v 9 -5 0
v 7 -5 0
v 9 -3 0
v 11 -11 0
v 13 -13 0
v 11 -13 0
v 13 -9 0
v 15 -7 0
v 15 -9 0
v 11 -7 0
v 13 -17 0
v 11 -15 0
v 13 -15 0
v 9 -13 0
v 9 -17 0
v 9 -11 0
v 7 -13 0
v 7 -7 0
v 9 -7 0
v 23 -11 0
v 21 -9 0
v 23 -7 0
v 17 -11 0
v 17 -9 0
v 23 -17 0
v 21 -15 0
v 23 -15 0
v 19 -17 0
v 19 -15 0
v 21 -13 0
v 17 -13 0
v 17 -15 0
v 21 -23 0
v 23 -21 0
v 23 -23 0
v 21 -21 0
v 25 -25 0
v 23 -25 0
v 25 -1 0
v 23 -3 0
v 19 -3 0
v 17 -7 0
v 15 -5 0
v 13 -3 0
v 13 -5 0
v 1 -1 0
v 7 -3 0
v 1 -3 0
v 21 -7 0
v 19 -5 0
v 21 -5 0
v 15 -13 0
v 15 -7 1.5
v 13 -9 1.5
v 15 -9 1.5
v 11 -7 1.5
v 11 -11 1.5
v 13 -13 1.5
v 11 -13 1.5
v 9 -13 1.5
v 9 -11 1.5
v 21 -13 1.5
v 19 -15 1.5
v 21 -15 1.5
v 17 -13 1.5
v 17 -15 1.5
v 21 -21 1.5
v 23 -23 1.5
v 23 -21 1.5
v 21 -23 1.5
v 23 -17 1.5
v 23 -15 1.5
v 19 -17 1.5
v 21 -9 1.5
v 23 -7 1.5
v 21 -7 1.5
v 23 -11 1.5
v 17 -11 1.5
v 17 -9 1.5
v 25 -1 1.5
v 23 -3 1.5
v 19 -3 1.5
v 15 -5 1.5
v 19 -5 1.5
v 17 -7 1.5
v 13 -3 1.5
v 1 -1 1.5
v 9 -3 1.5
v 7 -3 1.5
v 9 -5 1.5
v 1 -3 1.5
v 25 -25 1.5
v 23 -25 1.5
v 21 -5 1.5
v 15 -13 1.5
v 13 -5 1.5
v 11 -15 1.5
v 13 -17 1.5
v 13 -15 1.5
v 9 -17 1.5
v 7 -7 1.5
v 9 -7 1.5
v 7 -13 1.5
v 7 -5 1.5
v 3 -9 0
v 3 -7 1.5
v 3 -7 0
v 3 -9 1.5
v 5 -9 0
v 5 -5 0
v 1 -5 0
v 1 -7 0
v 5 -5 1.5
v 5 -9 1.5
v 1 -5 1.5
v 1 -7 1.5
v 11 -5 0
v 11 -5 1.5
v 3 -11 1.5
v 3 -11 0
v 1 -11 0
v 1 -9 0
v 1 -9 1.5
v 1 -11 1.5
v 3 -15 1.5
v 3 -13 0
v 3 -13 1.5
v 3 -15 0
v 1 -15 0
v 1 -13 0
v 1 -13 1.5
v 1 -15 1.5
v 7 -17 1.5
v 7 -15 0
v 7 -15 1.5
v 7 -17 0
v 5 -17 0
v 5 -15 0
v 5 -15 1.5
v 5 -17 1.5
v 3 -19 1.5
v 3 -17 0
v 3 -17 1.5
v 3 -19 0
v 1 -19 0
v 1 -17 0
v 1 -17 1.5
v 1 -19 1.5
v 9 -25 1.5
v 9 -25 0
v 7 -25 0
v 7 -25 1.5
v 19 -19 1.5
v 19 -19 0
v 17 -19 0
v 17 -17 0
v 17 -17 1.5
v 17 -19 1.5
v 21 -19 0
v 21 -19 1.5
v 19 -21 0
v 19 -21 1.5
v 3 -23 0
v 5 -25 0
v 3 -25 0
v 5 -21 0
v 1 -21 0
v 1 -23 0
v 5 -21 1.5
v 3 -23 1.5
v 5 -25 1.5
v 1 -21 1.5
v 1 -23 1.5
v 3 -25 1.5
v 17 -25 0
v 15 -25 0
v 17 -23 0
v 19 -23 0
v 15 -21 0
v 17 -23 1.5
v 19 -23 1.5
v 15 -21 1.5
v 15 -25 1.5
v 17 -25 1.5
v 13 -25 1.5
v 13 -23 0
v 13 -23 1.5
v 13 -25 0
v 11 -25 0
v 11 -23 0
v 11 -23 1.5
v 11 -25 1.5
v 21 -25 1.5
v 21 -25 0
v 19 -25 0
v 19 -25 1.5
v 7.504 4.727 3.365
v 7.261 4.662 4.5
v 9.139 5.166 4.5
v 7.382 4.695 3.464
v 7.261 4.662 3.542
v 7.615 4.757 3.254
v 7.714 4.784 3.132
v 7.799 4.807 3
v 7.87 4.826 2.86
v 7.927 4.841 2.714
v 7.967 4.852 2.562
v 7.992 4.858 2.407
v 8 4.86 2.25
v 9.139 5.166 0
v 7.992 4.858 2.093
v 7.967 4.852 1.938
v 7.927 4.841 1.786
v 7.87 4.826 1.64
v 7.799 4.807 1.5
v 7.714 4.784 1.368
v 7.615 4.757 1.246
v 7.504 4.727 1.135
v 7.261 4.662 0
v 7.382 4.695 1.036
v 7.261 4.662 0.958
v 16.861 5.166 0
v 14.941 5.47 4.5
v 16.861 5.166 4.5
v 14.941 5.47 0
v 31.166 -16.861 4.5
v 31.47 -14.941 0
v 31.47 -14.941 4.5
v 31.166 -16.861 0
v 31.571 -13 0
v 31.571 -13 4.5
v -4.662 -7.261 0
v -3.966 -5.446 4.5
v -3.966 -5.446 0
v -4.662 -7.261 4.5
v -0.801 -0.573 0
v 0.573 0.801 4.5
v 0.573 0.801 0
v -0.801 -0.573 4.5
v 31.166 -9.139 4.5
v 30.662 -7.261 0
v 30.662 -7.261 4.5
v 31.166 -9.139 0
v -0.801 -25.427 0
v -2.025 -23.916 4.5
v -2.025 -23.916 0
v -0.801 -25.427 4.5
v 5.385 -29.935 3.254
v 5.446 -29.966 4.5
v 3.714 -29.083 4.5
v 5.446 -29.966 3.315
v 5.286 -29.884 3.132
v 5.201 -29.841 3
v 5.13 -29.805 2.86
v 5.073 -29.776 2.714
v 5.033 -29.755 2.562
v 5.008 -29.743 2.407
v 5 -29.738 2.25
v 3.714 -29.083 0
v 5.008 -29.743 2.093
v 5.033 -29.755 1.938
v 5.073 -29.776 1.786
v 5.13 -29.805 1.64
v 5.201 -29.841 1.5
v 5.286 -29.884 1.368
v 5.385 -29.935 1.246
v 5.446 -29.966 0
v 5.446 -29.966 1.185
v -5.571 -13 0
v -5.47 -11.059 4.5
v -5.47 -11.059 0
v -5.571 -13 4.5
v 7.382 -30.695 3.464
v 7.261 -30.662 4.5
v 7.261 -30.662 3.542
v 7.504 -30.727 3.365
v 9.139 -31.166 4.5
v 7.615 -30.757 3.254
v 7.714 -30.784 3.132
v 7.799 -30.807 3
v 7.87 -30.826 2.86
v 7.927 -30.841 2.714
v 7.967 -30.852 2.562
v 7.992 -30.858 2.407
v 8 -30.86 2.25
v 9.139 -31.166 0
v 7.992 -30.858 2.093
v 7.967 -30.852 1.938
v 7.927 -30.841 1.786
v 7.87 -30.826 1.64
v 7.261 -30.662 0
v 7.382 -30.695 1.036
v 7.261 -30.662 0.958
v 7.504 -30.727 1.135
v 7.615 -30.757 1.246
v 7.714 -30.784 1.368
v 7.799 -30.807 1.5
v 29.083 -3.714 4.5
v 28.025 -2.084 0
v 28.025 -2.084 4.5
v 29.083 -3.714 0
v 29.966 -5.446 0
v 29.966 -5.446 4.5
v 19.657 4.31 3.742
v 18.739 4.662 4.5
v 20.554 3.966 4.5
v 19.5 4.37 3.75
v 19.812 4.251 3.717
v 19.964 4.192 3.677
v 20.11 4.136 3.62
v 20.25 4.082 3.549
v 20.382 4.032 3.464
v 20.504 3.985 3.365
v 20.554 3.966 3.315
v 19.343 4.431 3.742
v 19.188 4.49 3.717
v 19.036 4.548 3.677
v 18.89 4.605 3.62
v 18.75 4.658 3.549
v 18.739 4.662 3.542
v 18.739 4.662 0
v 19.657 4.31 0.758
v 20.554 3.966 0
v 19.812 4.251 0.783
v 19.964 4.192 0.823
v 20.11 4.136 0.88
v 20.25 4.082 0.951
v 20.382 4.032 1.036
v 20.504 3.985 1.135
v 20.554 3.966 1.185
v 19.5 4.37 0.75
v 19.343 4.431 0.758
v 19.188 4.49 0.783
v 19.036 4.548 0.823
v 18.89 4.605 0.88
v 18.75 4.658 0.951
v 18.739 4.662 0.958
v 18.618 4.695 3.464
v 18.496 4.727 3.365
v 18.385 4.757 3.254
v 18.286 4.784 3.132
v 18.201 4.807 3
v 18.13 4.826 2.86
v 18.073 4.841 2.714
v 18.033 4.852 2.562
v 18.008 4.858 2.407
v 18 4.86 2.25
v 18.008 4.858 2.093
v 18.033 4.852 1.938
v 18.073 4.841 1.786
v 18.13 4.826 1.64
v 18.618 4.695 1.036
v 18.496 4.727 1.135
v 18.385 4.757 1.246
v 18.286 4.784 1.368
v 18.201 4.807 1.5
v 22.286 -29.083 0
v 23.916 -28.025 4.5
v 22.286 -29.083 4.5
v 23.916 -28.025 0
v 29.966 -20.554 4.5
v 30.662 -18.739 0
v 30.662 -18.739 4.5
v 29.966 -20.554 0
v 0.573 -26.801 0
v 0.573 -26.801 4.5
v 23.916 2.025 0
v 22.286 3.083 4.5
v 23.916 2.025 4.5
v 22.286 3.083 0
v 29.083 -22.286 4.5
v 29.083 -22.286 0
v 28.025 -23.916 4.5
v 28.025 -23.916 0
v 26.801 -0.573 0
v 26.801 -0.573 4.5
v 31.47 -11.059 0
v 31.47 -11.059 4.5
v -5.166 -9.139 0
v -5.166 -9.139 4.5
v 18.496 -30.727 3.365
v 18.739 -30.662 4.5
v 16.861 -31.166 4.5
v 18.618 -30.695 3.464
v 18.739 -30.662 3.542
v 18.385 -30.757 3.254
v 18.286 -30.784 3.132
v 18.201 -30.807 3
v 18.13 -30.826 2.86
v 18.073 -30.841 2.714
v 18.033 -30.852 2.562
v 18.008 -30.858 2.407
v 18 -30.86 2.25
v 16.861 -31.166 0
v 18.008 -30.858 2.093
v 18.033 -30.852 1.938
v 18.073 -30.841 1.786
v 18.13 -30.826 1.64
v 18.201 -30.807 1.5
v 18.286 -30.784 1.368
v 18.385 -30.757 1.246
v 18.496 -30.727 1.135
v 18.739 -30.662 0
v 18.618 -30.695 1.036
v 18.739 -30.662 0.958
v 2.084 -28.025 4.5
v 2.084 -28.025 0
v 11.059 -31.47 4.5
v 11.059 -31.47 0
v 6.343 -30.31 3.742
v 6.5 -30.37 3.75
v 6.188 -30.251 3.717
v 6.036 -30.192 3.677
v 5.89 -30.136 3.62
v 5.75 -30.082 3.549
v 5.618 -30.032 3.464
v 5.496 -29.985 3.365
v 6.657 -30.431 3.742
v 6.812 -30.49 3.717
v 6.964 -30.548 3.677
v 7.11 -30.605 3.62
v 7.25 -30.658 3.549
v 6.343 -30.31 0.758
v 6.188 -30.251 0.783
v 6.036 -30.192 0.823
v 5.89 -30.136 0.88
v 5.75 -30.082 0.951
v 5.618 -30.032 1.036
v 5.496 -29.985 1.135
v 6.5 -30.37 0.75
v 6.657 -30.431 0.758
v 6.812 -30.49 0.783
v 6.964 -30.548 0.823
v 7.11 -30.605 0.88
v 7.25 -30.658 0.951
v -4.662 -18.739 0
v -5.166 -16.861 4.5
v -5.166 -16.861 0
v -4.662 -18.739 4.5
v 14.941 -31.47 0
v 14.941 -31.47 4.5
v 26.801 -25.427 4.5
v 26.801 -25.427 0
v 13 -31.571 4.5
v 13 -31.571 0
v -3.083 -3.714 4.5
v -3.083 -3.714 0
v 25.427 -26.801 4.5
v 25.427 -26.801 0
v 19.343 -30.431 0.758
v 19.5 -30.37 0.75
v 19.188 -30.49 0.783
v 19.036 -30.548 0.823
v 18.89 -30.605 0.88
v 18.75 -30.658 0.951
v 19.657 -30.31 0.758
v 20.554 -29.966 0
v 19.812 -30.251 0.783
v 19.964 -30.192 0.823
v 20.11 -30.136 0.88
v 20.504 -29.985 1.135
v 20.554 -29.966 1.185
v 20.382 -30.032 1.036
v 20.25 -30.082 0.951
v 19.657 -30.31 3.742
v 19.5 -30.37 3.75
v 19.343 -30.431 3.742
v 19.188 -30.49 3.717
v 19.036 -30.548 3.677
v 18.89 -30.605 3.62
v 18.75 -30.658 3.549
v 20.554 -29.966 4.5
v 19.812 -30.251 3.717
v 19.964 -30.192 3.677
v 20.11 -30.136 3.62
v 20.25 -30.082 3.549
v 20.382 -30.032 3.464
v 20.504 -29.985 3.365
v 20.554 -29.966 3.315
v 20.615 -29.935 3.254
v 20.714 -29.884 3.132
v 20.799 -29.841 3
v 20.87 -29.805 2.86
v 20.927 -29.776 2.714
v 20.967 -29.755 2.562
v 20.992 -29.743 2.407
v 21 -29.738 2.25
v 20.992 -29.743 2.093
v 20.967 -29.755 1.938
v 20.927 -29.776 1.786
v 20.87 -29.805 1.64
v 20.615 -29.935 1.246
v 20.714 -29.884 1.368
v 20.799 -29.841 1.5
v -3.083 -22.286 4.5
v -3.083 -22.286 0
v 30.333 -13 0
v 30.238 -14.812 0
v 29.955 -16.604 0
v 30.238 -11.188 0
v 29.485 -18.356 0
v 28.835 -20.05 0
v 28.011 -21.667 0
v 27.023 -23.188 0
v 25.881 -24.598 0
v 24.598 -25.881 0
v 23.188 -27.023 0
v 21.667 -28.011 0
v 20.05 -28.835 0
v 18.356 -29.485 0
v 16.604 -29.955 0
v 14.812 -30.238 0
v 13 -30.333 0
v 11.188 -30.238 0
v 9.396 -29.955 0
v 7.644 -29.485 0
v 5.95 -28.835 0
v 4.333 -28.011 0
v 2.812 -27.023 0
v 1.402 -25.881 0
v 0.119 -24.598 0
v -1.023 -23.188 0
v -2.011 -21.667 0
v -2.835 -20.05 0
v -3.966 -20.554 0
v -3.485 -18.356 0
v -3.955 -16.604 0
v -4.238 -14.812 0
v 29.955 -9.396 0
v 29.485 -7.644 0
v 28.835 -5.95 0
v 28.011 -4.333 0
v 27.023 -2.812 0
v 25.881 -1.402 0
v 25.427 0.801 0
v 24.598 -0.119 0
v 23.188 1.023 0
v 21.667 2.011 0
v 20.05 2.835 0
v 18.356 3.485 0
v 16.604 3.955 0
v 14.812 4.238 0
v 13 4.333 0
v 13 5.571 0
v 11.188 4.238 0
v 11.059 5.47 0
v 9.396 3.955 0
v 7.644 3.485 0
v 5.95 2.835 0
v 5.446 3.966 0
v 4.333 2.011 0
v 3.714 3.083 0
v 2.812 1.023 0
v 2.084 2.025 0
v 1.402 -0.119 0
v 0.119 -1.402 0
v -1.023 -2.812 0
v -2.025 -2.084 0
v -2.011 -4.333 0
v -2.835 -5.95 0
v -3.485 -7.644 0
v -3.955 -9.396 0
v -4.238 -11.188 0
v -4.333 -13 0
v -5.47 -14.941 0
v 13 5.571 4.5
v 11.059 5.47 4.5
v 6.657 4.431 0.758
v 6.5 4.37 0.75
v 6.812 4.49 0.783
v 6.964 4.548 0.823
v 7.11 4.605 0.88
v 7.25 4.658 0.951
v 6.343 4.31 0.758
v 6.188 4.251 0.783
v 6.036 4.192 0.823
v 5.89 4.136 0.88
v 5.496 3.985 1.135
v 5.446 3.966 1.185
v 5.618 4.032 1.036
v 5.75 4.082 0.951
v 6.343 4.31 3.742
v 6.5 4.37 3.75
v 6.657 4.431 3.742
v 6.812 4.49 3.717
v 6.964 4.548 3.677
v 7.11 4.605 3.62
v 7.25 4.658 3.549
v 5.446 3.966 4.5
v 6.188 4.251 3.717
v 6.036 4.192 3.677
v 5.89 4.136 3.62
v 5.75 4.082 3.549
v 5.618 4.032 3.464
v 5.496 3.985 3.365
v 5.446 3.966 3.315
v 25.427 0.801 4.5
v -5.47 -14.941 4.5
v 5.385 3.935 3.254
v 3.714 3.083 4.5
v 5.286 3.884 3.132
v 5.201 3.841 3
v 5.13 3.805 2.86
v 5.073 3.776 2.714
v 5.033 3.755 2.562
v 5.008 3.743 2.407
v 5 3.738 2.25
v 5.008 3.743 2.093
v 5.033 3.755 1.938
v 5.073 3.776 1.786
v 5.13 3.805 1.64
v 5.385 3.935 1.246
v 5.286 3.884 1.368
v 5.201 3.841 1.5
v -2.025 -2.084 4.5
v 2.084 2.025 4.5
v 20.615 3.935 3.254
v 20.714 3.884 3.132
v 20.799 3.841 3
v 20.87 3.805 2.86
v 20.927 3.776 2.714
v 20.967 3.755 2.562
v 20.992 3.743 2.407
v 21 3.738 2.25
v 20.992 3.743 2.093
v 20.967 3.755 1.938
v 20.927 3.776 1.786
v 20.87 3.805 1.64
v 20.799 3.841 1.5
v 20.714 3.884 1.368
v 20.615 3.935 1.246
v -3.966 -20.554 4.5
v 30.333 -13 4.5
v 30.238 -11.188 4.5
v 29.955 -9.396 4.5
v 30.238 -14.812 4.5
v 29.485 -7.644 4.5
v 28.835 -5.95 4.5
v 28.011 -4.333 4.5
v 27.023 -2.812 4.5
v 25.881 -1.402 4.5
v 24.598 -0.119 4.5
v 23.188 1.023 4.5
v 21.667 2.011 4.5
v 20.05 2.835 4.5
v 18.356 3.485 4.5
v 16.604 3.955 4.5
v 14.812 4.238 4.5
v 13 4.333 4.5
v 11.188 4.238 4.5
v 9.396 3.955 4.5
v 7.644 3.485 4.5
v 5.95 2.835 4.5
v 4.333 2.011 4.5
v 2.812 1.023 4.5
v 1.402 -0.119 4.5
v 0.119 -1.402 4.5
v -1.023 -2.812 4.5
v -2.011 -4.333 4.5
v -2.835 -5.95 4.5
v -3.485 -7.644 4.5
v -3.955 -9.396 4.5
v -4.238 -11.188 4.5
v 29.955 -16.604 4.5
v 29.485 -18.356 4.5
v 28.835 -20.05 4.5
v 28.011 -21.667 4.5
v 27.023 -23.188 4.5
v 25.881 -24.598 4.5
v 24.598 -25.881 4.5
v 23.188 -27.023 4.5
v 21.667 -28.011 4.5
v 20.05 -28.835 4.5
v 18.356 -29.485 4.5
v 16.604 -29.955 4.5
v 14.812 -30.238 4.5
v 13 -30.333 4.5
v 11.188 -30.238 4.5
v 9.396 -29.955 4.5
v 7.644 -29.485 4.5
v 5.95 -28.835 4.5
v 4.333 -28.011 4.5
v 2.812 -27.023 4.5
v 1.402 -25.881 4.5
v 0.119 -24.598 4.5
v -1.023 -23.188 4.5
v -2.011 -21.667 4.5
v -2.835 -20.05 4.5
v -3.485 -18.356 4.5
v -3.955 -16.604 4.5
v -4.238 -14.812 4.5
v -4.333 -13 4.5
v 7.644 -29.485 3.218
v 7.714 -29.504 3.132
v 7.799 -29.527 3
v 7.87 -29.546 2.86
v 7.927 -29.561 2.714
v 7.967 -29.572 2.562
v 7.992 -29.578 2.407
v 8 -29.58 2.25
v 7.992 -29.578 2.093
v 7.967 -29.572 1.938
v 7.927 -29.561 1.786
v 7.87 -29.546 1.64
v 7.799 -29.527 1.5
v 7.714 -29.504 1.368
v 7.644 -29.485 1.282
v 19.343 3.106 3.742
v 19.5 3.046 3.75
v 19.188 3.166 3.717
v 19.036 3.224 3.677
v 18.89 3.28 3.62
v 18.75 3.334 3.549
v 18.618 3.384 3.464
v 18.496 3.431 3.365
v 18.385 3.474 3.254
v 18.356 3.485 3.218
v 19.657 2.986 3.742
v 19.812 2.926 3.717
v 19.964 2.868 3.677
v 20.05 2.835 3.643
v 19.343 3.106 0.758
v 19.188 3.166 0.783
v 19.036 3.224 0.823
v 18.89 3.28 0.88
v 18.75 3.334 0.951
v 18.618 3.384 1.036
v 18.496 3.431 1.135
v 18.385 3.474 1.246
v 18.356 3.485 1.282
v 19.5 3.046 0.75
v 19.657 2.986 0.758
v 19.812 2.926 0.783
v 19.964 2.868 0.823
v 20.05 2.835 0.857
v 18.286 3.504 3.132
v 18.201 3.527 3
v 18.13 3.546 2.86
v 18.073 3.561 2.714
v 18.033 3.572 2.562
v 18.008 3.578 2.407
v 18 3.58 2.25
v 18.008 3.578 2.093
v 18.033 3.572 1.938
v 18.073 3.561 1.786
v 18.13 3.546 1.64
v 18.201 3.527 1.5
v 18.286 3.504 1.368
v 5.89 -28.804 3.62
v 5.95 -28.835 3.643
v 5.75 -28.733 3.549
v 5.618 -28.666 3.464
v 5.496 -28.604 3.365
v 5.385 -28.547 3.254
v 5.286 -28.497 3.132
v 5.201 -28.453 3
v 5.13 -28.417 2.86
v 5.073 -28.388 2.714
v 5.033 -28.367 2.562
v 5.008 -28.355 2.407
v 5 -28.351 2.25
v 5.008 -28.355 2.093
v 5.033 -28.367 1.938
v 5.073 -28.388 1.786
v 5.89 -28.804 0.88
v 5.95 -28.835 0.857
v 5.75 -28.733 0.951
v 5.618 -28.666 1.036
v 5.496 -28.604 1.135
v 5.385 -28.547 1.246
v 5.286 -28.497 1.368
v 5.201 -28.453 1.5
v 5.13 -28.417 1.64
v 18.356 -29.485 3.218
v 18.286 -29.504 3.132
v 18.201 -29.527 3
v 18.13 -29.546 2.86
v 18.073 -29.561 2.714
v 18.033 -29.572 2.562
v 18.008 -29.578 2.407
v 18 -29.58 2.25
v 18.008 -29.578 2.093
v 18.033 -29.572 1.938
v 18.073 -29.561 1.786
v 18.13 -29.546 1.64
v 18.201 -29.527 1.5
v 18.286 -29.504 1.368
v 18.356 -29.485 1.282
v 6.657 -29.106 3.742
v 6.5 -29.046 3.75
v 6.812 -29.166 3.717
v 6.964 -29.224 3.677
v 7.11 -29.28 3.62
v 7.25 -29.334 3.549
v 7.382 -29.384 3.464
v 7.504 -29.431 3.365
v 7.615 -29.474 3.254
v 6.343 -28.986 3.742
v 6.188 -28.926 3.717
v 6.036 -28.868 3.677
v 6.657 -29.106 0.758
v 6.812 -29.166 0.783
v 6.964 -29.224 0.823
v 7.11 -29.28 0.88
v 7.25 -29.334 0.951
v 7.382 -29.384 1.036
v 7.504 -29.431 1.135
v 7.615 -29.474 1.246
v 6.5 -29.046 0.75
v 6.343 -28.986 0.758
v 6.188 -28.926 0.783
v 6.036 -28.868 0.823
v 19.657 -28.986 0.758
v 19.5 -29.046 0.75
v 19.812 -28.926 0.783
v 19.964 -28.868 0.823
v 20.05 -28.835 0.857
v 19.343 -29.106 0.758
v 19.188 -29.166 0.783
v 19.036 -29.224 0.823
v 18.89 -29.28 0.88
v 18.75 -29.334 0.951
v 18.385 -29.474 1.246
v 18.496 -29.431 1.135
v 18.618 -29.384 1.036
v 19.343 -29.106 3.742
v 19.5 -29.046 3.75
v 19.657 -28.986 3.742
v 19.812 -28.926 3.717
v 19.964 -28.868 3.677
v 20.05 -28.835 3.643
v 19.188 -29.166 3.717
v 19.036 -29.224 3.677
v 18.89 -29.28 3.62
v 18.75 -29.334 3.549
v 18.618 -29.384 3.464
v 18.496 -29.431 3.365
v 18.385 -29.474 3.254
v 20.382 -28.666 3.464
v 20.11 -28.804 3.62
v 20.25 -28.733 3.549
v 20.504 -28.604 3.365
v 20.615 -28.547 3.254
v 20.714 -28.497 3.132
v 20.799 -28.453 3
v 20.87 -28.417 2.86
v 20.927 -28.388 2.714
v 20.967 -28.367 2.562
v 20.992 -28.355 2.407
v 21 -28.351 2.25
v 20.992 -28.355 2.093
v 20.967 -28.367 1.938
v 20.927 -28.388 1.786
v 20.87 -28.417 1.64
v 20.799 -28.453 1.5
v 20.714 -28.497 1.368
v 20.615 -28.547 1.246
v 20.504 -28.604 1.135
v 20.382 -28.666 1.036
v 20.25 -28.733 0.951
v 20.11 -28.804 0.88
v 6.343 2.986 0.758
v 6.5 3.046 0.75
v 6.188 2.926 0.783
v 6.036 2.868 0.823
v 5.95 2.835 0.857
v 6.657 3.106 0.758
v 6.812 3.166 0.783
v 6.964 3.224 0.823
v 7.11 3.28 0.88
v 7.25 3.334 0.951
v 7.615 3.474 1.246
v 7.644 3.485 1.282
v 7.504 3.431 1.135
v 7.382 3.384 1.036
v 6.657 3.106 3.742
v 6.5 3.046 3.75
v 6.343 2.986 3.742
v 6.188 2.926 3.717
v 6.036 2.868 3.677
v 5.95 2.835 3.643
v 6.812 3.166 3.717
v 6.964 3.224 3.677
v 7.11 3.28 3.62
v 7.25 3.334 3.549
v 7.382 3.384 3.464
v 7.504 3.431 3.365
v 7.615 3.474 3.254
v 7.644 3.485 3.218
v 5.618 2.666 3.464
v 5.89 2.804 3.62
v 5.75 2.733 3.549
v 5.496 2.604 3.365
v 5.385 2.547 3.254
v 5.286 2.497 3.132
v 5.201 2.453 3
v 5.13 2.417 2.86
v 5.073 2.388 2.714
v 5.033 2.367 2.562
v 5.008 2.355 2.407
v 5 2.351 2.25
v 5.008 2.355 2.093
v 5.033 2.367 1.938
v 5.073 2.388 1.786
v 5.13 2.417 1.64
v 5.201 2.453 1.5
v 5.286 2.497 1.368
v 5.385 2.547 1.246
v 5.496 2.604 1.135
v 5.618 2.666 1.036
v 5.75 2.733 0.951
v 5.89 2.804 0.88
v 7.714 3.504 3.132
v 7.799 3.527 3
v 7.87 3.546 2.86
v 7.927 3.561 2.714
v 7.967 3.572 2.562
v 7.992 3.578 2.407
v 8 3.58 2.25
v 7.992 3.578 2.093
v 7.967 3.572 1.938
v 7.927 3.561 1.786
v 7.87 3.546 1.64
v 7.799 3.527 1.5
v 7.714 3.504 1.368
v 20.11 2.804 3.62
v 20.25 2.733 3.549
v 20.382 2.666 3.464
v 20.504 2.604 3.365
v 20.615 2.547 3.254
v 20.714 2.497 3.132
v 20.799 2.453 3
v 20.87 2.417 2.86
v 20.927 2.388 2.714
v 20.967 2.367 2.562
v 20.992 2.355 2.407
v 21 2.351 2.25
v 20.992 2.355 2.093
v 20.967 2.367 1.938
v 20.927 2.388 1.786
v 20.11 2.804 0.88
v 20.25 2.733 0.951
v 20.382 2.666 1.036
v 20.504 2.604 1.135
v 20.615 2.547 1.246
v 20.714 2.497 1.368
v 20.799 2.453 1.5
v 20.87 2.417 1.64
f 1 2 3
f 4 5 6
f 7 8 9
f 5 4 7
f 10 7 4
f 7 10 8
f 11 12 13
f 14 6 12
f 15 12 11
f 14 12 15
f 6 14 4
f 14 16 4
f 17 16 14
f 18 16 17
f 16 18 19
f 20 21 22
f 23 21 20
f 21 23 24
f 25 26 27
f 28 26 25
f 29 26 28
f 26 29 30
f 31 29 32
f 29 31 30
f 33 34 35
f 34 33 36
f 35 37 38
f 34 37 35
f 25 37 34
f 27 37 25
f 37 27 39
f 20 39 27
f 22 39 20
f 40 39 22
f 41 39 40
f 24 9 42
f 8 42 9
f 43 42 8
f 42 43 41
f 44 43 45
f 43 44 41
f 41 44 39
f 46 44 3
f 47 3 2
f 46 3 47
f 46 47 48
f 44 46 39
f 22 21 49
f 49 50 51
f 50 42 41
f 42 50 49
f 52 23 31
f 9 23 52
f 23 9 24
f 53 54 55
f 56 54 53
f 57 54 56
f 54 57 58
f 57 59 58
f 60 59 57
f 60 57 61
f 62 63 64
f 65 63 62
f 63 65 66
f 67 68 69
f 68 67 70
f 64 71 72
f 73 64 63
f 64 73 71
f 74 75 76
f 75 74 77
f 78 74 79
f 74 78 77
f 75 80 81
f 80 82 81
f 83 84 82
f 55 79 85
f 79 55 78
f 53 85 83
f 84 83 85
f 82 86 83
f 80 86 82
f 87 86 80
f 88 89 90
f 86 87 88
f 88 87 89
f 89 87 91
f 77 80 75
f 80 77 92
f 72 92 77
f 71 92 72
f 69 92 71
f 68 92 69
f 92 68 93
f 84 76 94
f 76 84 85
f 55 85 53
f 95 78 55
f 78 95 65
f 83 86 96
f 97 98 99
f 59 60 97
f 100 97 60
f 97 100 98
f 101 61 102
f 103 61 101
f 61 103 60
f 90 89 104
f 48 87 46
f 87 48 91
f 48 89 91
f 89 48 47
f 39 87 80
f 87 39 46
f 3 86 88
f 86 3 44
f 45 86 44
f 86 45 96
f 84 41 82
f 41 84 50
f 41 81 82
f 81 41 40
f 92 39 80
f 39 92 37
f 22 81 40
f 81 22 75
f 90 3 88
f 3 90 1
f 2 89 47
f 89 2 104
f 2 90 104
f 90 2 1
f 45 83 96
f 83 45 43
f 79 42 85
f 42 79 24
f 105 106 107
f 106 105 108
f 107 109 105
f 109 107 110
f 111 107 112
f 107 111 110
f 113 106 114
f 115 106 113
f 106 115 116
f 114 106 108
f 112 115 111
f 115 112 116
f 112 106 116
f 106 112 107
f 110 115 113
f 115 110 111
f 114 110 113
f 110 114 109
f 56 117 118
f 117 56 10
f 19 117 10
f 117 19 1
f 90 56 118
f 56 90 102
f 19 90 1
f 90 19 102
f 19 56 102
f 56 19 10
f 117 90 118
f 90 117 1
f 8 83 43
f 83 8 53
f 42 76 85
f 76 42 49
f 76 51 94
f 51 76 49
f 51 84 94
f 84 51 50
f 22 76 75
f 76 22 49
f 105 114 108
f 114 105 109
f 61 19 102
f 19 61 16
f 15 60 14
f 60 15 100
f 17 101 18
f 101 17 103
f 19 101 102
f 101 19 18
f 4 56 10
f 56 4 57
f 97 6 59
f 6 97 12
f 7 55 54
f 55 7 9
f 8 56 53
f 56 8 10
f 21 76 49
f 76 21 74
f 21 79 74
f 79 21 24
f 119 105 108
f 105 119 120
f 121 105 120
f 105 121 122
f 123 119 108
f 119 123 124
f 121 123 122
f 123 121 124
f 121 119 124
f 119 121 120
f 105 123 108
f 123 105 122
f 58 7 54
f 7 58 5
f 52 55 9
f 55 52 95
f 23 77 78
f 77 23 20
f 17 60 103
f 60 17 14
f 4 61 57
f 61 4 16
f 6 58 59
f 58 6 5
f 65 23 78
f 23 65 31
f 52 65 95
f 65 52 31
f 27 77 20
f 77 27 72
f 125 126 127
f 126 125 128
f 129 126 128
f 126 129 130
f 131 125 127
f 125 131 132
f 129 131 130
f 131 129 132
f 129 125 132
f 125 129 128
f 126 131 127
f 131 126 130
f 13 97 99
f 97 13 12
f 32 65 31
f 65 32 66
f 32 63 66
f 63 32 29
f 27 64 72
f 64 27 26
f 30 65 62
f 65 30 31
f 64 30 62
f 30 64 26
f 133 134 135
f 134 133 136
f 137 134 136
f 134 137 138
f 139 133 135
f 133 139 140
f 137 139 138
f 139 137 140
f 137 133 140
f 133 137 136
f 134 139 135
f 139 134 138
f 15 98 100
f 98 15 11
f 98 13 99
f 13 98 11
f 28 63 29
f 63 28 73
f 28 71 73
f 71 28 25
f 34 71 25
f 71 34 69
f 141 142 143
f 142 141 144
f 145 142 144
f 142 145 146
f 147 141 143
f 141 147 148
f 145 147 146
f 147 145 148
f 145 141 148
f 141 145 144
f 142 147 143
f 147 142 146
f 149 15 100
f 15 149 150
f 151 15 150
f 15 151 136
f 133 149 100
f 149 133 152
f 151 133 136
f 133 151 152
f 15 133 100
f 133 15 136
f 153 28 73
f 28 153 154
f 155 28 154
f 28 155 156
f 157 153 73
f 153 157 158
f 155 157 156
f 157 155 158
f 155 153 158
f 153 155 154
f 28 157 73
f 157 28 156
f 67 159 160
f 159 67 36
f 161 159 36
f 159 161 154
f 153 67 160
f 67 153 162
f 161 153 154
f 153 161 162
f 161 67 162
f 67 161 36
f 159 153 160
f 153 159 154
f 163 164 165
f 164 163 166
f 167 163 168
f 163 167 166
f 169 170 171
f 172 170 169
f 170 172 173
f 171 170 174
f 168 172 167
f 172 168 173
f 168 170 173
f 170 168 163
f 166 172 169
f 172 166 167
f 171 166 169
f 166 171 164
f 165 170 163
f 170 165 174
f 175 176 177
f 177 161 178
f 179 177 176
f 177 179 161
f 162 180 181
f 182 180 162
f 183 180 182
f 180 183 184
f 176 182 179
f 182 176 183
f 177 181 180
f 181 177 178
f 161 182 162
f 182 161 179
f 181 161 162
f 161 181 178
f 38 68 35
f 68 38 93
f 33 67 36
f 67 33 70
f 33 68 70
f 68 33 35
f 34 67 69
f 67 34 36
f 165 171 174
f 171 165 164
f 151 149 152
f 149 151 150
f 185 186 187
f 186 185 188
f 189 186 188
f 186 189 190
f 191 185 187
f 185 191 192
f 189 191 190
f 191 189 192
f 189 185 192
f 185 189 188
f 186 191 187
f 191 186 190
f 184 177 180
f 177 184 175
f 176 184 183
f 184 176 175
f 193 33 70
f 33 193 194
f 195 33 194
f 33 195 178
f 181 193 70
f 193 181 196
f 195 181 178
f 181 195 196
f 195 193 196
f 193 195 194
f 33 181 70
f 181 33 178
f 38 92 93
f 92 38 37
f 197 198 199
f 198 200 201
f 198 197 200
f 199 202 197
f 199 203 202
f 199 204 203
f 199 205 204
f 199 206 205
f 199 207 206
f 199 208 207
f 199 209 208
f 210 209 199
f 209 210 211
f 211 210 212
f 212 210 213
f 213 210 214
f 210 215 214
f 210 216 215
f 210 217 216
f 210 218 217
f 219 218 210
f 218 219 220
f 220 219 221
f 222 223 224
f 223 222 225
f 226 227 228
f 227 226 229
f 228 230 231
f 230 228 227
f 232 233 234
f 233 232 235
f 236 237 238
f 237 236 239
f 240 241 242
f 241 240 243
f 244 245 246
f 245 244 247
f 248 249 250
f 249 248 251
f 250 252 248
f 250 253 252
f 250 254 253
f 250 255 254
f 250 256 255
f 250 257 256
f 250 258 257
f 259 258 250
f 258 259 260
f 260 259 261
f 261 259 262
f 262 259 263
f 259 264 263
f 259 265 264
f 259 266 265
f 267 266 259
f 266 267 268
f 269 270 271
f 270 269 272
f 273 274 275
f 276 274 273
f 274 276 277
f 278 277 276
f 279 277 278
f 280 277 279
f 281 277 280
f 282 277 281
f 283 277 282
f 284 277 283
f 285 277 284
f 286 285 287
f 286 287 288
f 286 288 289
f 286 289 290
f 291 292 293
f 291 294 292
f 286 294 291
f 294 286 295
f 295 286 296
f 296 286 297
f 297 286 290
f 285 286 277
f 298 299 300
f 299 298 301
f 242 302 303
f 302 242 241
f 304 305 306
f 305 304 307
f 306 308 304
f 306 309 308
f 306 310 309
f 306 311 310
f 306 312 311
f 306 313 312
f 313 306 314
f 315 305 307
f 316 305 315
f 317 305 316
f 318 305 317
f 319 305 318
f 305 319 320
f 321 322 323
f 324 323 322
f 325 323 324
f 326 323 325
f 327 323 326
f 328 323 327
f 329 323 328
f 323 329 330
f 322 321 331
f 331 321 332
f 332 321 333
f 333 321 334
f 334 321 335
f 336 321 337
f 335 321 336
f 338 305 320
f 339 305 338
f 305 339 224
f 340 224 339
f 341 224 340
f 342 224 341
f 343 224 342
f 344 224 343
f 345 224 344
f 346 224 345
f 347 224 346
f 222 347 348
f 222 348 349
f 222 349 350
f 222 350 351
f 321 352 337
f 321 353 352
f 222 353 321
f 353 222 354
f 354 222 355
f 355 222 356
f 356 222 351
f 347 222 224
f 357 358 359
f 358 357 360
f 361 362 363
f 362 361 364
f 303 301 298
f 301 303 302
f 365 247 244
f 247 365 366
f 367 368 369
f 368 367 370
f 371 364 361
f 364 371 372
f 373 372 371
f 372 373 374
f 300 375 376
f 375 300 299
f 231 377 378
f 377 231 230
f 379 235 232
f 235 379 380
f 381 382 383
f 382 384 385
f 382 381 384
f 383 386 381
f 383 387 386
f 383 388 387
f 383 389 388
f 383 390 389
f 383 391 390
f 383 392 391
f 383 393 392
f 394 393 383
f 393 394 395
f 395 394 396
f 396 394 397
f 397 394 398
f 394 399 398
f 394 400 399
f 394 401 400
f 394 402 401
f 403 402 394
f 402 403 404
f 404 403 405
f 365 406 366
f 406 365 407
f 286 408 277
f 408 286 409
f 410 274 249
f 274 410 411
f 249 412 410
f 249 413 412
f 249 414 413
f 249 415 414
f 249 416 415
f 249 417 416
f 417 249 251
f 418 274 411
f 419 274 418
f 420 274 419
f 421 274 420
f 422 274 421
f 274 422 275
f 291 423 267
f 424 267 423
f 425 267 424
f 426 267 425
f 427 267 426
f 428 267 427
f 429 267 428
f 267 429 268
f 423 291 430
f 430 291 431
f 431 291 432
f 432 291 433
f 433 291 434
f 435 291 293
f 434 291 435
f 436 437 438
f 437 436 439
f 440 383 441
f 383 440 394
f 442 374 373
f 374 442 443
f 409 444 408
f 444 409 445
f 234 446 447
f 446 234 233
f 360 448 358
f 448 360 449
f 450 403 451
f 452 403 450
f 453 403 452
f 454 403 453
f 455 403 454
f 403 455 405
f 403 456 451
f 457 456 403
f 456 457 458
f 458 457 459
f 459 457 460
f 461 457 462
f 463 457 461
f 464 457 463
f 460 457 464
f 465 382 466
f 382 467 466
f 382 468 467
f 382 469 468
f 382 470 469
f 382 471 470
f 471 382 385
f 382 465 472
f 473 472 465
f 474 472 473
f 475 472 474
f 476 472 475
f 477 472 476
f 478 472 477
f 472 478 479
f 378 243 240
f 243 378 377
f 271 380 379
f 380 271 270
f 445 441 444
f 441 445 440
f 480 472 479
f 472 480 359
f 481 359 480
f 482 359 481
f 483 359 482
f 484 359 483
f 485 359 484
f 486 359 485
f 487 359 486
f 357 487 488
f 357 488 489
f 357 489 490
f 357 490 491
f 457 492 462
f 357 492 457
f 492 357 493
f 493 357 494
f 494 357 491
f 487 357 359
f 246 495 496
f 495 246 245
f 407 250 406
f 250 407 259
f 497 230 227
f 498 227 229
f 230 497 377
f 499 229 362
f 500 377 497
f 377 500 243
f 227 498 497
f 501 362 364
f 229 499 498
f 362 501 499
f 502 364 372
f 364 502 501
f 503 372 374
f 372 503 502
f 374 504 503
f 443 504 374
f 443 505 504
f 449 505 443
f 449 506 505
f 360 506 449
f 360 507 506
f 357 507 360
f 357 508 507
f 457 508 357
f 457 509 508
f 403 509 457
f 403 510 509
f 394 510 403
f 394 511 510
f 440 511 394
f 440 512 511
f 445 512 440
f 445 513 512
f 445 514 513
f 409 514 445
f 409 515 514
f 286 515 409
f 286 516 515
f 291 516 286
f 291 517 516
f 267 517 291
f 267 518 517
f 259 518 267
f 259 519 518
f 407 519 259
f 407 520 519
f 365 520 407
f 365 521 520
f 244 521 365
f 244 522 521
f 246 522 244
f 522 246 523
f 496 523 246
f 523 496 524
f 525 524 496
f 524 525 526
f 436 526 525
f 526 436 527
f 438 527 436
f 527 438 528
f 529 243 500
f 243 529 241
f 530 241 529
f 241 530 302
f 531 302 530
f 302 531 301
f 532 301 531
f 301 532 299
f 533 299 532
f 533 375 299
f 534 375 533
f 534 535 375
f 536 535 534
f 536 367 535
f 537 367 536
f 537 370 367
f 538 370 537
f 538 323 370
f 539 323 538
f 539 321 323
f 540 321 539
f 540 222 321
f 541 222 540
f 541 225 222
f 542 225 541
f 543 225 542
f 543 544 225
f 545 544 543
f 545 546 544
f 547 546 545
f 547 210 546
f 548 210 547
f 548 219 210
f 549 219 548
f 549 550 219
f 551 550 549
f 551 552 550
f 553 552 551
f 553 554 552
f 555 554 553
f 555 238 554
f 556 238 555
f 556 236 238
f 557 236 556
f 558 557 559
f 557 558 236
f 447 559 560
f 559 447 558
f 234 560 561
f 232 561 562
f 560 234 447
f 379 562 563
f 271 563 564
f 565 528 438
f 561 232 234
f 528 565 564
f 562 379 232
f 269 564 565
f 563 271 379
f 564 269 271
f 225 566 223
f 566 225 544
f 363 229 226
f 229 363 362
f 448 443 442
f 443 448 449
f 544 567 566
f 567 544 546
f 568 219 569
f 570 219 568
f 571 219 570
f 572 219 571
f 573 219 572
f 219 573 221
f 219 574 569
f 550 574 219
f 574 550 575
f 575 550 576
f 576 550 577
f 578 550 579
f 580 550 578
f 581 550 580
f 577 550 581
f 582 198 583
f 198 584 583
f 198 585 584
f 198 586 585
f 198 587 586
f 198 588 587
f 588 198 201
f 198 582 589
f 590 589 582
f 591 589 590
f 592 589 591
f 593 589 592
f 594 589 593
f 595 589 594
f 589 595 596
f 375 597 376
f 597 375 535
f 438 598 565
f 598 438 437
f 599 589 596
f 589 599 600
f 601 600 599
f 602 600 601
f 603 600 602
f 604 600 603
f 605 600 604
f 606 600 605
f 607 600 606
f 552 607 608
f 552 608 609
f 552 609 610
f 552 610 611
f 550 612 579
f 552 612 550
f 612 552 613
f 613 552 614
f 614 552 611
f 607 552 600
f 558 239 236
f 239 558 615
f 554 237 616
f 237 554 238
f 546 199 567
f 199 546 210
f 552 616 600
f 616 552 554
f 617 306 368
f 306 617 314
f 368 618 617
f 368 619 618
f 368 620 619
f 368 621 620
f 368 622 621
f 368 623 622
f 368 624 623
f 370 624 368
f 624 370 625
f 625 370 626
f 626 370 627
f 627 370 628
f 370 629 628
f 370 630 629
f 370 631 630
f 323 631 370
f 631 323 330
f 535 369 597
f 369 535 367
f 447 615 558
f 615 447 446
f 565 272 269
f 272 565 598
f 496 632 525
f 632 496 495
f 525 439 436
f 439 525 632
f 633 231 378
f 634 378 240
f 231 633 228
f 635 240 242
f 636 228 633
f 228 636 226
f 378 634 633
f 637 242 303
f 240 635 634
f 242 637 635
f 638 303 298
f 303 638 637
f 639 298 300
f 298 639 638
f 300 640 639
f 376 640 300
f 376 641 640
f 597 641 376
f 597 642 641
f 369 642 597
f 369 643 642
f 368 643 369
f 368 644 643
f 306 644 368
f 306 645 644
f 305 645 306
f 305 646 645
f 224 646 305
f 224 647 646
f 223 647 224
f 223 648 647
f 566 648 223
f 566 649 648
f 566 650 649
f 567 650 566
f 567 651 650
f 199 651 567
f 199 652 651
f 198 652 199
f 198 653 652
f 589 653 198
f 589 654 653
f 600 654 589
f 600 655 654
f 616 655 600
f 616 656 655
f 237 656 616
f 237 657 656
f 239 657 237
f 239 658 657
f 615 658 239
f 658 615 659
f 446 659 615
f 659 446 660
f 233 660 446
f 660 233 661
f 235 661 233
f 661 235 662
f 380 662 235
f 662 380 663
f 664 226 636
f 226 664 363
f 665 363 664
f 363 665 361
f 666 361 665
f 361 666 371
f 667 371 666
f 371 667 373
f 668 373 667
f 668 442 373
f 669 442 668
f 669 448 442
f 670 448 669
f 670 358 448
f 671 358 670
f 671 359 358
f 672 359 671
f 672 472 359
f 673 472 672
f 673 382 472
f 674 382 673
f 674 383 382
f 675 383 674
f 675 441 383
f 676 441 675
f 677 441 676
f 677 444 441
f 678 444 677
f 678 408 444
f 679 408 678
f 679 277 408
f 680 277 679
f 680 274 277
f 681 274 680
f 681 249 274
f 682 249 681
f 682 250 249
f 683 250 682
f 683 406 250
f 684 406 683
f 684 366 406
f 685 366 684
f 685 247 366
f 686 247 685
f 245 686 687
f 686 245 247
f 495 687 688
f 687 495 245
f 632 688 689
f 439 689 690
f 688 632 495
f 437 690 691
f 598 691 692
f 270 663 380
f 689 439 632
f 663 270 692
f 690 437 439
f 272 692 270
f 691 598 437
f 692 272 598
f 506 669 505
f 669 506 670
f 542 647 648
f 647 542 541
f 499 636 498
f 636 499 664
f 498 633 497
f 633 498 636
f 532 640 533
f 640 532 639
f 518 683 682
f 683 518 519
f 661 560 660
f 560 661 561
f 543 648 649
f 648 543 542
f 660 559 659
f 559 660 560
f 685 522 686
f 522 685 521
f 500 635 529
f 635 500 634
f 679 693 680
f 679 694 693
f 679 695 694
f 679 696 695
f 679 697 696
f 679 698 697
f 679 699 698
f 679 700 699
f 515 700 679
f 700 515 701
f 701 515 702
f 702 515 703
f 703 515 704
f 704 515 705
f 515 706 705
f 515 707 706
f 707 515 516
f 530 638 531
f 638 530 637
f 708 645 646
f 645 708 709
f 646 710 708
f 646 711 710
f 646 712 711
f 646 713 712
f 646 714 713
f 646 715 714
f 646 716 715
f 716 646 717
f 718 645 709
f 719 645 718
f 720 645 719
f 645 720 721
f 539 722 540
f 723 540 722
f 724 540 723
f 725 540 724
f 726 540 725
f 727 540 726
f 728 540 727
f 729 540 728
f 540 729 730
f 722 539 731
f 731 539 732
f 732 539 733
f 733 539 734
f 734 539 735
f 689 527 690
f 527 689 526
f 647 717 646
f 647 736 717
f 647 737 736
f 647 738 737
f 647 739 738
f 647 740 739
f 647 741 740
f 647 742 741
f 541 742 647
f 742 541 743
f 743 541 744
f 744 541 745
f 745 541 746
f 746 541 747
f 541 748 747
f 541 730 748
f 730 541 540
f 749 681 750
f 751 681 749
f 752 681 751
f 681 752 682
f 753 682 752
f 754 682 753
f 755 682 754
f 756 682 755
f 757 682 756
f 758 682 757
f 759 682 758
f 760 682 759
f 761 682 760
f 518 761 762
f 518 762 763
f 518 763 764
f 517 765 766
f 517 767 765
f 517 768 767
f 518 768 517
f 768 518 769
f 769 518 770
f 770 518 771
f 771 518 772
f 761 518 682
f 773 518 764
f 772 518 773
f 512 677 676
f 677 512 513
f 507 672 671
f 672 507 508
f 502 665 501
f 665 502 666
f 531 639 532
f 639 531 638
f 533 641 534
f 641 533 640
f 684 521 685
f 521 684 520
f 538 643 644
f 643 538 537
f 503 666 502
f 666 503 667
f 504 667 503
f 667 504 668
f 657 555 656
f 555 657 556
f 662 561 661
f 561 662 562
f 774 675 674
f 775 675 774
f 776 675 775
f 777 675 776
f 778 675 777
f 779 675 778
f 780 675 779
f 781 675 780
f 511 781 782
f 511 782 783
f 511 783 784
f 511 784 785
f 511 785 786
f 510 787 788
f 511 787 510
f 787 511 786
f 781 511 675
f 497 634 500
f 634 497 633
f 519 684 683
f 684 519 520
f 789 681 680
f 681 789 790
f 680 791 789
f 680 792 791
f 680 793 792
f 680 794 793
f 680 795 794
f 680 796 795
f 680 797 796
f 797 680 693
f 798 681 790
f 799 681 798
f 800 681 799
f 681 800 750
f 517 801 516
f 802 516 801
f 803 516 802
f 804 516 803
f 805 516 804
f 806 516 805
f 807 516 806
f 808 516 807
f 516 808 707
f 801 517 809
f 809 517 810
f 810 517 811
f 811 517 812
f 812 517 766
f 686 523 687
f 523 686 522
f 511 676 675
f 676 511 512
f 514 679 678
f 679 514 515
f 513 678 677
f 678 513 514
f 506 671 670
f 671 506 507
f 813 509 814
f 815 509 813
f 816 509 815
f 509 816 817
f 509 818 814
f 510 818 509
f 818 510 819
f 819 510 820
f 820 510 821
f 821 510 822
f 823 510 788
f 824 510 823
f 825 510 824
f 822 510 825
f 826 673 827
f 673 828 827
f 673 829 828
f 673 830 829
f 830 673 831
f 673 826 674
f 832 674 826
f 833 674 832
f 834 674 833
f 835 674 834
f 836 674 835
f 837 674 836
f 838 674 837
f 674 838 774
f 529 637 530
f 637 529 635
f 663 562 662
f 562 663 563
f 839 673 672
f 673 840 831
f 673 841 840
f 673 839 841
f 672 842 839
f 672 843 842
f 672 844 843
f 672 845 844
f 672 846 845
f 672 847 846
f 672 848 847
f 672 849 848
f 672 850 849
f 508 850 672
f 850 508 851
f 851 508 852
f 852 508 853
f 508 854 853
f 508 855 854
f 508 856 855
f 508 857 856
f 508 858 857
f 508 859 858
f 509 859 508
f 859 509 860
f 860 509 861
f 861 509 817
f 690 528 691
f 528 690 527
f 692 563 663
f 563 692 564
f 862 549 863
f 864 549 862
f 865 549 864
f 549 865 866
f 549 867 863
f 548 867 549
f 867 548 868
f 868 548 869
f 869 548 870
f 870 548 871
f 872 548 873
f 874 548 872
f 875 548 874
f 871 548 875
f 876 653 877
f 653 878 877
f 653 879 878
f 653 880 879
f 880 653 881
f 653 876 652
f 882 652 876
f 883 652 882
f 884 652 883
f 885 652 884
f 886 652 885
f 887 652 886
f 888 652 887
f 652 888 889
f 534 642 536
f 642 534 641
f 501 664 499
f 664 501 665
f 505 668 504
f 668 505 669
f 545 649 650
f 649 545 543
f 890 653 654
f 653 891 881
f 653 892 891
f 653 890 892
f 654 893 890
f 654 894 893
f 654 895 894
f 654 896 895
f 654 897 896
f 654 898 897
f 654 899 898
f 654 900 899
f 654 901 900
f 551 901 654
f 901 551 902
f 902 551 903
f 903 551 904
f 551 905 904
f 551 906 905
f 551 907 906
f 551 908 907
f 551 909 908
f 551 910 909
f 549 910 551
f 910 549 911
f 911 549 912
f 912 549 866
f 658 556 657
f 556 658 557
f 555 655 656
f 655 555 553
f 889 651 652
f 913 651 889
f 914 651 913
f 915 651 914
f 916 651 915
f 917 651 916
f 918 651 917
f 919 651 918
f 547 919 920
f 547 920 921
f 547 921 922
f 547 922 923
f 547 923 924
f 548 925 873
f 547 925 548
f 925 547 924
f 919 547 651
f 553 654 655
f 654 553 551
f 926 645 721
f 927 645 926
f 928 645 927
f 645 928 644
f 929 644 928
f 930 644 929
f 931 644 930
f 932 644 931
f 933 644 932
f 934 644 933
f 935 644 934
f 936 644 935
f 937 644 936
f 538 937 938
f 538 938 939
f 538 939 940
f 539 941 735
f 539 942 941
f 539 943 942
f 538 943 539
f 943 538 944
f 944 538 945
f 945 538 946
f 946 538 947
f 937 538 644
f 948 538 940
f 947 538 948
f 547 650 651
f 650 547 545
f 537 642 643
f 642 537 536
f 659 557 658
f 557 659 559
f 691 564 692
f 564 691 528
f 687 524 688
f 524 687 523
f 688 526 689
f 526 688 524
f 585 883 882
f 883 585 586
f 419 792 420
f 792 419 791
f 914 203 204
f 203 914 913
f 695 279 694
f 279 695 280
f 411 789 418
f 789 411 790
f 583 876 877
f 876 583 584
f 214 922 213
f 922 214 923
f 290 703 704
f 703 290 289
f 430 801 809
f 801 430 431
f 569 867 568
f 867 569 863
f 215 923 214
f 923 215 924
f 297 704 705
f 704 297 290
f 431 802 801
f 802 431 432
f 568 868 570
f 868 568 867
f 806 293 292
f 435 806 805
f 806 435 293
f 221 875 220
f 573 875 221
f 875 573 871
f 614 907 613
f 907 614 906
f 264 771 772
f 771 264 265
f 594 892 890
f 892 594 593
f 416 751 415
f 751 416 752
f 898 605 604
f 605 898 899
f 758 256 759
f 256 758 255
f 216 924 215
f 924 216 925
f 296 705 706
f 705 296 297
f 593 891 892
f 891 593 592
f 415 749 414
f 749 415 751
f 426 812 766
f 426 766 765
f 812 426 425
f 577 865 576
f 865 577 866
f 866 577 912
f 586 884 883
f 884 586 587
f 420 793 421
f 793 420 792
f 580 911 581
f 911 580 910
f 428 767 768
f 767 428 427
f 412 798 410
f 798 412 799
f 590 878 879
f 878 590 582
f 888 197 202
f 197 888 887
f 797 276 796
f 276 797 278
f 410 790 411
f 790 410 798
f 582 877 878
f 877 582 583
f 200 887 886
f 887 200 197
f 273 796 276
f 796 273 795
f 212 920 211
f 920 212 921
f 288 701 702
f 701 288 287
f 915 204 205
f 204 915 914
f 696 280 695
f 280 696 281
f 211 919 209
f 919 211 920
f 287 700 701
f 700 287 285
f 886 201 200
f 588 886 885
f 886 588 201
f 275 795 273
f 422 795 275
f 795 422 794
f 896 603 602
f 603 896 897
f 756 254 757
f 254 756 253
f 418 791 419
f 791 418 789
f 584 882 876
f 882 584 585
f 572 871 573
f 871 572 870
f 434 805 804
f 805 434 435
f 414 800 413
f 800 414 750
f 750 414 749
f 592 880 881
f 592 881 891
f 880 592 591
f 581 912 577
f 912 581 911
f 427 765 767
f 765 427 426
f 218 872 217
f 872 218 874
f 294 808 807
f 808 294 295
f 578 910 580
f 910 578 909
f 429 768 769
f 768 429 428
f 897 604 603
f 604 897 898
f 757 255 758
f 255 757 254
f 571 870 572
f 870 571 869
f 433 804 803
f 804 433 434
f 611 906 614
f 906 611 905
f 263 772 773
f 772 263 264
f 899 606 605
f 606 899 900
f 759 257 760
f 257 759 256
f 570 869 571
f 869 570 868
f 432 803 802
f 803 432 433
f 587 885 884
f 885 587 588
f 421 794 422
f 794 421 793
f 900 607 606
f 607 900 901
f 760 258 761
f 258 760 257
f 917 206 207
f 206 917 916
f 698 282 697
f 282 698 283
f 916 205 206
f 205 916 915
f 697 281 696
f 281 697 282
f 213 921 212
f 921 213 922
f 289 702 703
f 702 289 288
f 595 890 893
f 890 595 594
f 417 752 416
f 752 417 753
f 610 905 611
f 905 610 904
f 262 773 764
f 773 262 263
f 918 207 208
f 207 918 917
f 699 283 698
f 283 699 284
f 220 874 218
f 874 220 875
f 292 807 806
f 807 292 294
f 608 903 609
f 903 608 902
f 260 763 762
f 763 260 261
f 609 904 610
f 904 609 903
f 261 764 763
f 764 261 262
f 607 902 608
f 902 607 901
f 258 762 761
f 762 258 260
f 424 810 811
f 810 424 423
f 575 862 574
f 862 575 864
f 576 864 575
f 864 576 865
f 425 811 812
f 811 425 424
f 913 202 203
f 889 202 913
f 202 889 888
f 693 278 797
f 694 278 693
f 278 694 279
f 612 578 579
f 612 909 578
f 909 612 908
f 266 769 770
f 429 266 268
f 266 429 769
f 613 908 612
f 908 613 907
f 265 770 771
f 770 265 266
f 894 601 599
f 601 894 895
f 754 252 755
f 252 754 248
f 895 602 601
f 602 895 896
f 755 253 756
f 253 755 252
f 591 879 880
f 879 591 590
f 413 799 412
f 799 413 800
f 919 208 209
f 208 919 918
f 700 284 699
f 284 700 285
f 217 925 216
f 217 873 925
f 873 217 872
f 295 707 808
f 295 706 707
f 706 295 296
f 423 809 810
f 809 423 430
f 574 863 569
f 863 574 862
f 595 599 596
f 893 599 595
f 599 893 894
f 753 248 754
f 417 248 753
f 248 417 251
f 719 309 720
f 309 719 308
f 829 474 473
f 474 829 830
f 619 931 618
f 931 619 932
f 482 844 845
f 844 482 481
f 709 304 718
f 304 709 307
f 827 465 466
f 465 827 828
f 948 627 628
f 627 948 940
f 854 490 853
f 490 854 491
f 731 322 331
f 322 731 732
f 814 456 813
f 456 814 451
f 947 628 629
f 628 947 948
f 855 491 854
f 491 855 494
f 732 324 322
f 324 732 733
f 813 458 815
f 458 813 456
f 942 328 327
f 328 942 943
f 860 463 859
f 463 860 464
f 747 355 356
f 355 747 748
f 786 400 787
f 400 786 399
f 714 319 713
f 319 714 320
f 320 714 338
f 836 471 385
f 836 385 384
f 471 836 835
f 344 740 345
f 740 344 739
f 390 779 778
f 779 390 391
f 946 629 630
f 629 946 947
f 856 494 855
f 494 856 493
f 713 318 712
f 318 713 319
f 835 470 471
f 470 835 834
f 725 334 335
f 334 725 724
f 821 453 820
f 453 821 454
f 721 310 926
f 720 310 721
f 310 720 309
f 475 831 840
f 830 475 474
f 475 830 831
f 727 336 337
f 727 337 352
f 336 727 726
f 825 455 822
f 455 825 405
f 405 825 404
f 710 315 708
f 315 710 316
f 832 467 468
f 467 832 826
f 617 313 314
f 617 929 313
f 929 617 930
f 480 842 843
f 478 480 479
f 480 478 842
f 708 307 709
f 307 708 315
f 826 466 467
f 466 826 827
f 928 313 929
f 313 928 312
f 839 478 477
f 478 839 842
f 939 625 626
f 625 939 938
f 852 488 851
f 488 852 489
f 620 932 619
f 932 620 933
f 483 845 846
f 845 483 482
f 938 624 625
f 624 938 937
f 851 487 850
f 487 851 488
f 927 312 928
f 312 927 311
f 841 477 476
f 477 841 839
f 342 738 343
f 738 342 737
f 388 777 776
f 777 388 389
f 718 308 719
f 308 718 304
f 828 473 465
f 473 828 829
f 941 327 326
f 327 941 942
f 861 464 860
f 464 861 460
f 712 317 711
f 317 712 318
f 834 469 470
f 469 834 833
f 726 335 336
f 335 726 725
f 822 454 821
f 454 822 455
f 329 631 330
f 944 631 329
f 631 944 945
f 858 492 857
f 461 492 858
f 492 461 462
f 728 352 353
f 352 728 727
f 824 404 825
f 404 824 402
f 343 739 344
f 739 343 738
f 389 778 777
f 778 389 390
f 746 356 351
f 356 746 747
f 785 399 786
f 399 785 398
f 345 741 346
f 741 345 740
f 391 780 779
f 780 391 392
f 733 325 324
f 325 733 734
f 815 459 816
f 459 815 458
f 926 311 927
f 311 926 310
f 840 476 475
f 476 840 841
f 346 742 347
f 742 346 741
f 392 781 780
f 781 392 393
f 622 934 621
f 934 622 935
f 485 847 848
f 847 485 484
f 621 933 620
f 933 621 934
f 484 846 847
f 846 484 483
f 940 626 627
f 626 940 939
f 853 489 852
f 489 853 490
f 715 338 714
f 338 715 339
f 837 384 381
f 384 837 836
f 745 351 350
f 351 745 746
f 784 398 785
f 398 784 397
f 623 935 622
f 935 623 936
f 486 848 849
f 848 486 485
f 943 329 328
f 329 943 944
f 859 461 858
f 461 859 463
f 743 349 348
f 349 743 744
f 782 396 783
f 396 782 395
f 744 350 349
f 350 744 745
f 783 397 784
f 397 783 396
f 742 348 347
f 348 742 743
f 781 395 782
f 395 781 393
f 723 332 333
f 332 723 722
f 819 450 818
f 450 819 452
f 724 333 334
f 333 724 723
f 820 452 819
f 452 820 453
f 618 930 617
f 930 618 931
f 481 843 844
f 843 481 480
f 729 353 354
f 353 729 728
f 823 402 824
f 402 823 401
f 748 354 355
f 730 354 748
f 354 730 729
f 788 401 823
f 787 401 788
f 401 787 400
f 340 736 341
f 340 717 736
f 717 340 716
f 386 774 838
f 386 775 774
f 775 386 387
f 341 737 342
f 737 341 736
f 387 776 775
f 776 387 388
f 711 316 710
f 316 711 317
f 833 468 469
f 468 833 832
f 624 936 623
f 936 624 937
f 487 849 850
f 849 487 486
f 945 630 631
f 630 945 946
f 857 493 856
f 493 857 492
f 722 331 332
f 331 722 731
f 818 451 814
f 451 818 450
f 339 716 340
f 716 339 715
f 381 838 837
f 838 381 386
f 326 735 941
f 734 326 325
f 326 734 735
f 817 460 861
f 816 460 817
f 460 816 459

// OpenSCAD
rotate([180,0,0])translate([0,0,-0.75]){
translate([2,2,0])  cube(size = [2,2,1.5], center=true);
translate([4,2,0])  cube(size = [2,2,1.5], center=true);
translate([6,2,0])  cube(size = [2,2,1.5], center=true);
translate([8,2,0])  cube(size = [2,2,1.5], center=true);
translate([10,2,0])  cube(size = [2,2,1.5], center=true);
translate([12,2,0])  cube(size = [2,2,1.5], center=true);
translate([14,2,0])  cube(size = [2,2,1.5], center=true);
translate([16,2,0])  cube(size = [2,2,1.5], center=true);
translate([18,2,0])  cube(size = [2,2,1.5], center=true);
translate([20,2,0])  cube(size = [2,2,1.5], center=true);
translate([22,2,0])  cube(size = [2,2,1.5], center=true);
translate([24,2,0])  cube(size = [2,2,1.5], center=true);
translate([24,2,0])  cube(size = [2,2,1.5], center=true);
translate([24,2,0])  cube(size = [2,2,1.5], center=true);
translate([24,2,0])  cube(size = [2,2,1.5], center=true);
translate([8,4,0])  cube(size = [2,2,1.5], center=true);
translate([8,4,0])  cube(size = [2,2,1.5], center=true);
translate([8,4,0])  cube(size = [2,2,1.5], center=true);
translate([14,4,0])  cube(size = [2,2,1.5], center=true);
translate([16,4,0])  cube(size = [2,2,1.5], center=true);
translate([18,4,0])  cube(size = [2,2,1.5], center=true);
translate([18,4,0])  cube(size = [2,2,1.5], center=true);
translate([18,4,0])  cube(size = [2,2,1.5], center=true);
translate([24,4,0])  cube(size = [2,2,1.5], center=true);
translate([2,6,0])  cube(size = [2,2,1.5], center=true);
translate([4,6,0])  cube(size = [2,2,1.5], center=true);
translate([4,6,0])  cube(size = [2,2,1.5], center=true);
translate([4,6,0])  cube(size = [2,2,1.5], center=true);
translate([10,6,0])  cube(size = [2,2,1.5], center=true);
translate([10,6,0])  cube(size = [2,2,1.5], center=true);
translate([10,6,0])  cube(size = [2,2,1.5], center=true);
translate([16,6,0])  cube(size = [2,2,1.5], center=true);
translate([18,6,0])  cube(size = [2,2,1.5], center=true);
translate([20,6,0])  cube(size = [2,2,1.5], center=true);
translate([20,6,0])  cube(size = [2,2,1.5], center=true);
translate([24,6,0])  cube(size = [2,2,1.5], center=true);
translate([24,6,0])  cube(size = [2,2,1.5], center=true);
translate([4,8,0])  cube(size = [2,2,1.5], center=true);
translate([4,8,0])  cube(size = [2,2,1.5], center=true);
translate([8,8,0])  cube(size = [2,2,1.5], center=true);
translate([8,8,0])  cube(size = [2,2,1.5], center=true);
translate([12,8,0])  cube(size = [2,2,1.5], center=true);
translate([14,8,0])  cube(size = [2,2,1.5], center=true);
translate([16,8,0])  cube(size = [2,2,1.5], center=true);
translate([16,8,0])  cube(size = [2,2,1.5], center=true);
translate([16,8,0])  cube(size = [2,2,1.5], center=true);
translate([22,8,0])  cube(size = [2,2,1.5], center=true);
translate([24,8,0])  cube(size = [2,2,1.5], center=true);
translate([2,10,0])  cube(size = [2,2,1.5], center=true);
translate([2,10,0])  cube(size = [2,2,1.5], center=true);
translate([2,10,0])  cube(size = [2,2,1.5], center=true);
translate([8,10,0])  cube(size = [2,2,1.5], center=true);
translate([8,10,0])  cube(size = [2,2,1.5], center=true);
translate([12,10,0])  cube(size = [2,2,1.5], center=true);
translate([12,10,0])  cube(size = [2,2,1.5], center=true);
translate([16,10,0])  cube(size = [2,2,1.5], center=true);
translate([18,10,0])  cube(size = [2,2,1.5], center=true);
translate([20,10,0])  cube(size = [2,2,1.5], center=true);
translate([22,10,0])  cube(size = [2,2,1.5], center=true);
translate([24,10,0])  cube(size = [2,2,1.5], center=true);
translate([24,10,0])  cube(size = [2,2,1.5], center=true);
translate([24,10,0])  cube(size = [2,2,1.5], center=true);
translate([24,10,0])  cube(size = [2,2,1.5], center=true);
translate([8,12,0])  cube(size = [2,2,1.5], center=true);
translate([10,12,0])  cube(size = [2,2,1.5], center=true);
translate([12,12,0])  cube(size = [2,2,1.5], center=true);
translate([12,12,0])  cube(size = [2,2,1.5], center=true);
translate([16,12,0])  cube(size = [2,2,1.5], center=true);
translate([16,12,0])  cube(size = [2,2,1.5], center=true);
translate([16,12,0])  cube(size = [2,2,1.5], center=true);
translate([16,12,0])  cube(size = [2,2,1.5], center=true);
translate([24,12,0])  cube(size = [2,2,1.5], center=true);
translate([2,14,0])  cube(size = [2,2,1.5], center=true);
translate([2,14,0])  cube(size = [2,2,1.5], center=true);
translate([2,14,0])  cube(size = [2,2,1.5], center=true);
translate([2,14,0])  cube(size = [2,2,1.5], center=true);
translate([10,14,0])  cube(size = [2,2,1.5], center=true);
translate([10,14,0])  cube(size = [2,2,1.5], center=true);
translate([10,14,0])  cube(size = [2,2,1.5], center=true);
translate([10,14,0])  cube(size = [2,2,1.5], center=true);
translate([18,14,0])  cube(size = [2,2,1.5], center=true);
translate([20,14,0])  cube(size = [2,2,1.5], center=true);
translate([20,14,0])  cube(size = [2,2,1.5], center=true);
translate([24,14,0])  cube(size = [2,2,1.5], center=true);
translate([24,14,0])  cube(size = [2,2,1.5], center=true);
translate([24,14,0])  cube(size = [2,2,1.5], center=true);
translate([6,16,0])  cube(size = [2,2,1.5], center=true);
translate([6,16,0])  cube(size = [2,2,1.5], center=true);
translate([10,16,0])  cube(size = [2,2,1.5], center=true);
translate([12,16,0])  cube(size = [2,2,1.5], center=true);
translate([12,16,0])  cube(size = [2,2,1.5], center=true);
translate([12,16,0])  cube(size = [2,2,1.5], center=true);
translate([12,16,0])  cube(size = [2,2,1.5], center=true);
translate([20,16,0])  cube(size = [2,2,1.5], center=true);
translate([22,16,0])  cube(size = [2,2,1.5], center=true);
translate([24,16,0])  cube(size = [2,2,1.5], center=true);
translate([2,18,0])  cube(size = [2,2,1.5], center=true);
translate([2,18,0])  cube(size = [2,2,1.5], center=true);
translate([2,18,0])  cube(size = [2,2,1.5], center=true);
translate([8,18,0])  cube(size = [2,2,1.5], center=true);
translate([8,18,0])  cube(size = [2,2,1.5], center=true);
translate([8,18,0])  cube(size = [2,2,1.5], center=true);
translate([8,18,0])  cube(size = [2,2,1.5], center=true);
translate([8,18,0])  cube(size = [2,2,1.5], center=true);
translate([18,18,0])  cube(size = [2,2,1.5], center=true);
translate([18,18,0])  cube(size = [2,2,1.5], center=true);
translate([18,18,0])  cube(size = [2,2,1.5], center=true);
translate([24,18,0])  cube(size = [2,2,1.5], center=true);
translate([24,18,0])  cube(size = [2,2,1.5], center=true);
translate([24,18,0])  cube(size = [2,2,1.5], center=true);
translate([24,18,0])  cube(size = [2,2,1.5], center=true);
translate([8,20,0])  cube(size = [2,2,1.5], center=true);
translate([8,20,0])  cube(size = [2,2,1.5], center=true);
translate([8,20,0])  cube(size = [2,2,1.5], center=true);
translate([8,20,0])  cube(size = [2,2,1.5], center=true);
translate([8,20,0])  cube(size = [2,2,1.5], center=true);
translate([8,20,0])  cube(size = [2,2,1.5], center=true);
translate([20,20,0])  cube(size = [2,2,1.5], center=true);
translate([20,20,0])  cube(size = [2,2,1.5], center=true);
translate([24,20,0])  cube(size = [2,2,1.5], center=true);
translate([2,22,0])  cube(size = [2,2,1.5], center=true);
translate([4,22,0])  cube(size = [2,2,1.5], center=true);
translate([4,22,0])  cube(size = [2,2,1.5], center=true);
translate([8,22,0])  cube(size = [2,2,1.5], center=true);
translate([8,22,0])  cube(size = [2,2,1.5], center=true);
translate([8,22,0])  cube(size = [2,2,1.5], center=true);
translate([8,22,0])  cube(size = [2,2,1.5], center=true);
translate([16,22,0])  cube(size = [2,2,1.5], center=true);
translate([18,22,0])  cube(size = [2,2,1.5], center=true);
translate([18,22,0])  cube(size = [2,2,1.5], center=true);
translate([22,22,0])  cube(size = [2,2,1.5], center=true);
translate([24,22,0])  cube(size = [2,2,1.5], center=true);
translate([24,22,0])  cube(size = [2,2,1.5], center=true);
translate([4,24,0])  cube(size = [2,2,1.5], center=true);
translate([4,24,0])  cube(size = [2,2,1.5], center=true);
translate([8,24,0])  cube(size = [2,2,1.5], center=true);
translate([8,24,0])  cube(size = [2,2,1.5], center=true);
translate([12,24,0])  cube(size = [2,2,1.5], center=true);
translate([12,24,0])  cube(size = [2,2,1.5], center=true);
translate([16,24,0])  cube(size = [2,2,1.5], center=true);
translate([16,24,0])  cube(size = [2,2,1.5], center=true);
translate([20,24,0])  cube(size = [2,2,1.5], center=true);
translate([20,24,0])  cube(size = [2,2,1.5], center=true);
translate([24,24,0])  cube(size = [2,2,1.5], center=true);
}
rotate([180,0,0])difference(){translate([13,13,-2.25])  cylinder(r=18.5714285714286,h=4.5,$fn=60, center=true);
translate([13,13,-2.25])  cylinder(r=17.3333333333333,h=4.5,$fn=60, center=true);
rotate([90,90,0])translate([2.25,6.5,0])  cylinder(r=1.5,h=400, $fn=60, center=true);
rotate([90,90,0])translate([2.25,19.5,0])  cylinder(r=1.5,h=400, $fn=60, center=true);}
